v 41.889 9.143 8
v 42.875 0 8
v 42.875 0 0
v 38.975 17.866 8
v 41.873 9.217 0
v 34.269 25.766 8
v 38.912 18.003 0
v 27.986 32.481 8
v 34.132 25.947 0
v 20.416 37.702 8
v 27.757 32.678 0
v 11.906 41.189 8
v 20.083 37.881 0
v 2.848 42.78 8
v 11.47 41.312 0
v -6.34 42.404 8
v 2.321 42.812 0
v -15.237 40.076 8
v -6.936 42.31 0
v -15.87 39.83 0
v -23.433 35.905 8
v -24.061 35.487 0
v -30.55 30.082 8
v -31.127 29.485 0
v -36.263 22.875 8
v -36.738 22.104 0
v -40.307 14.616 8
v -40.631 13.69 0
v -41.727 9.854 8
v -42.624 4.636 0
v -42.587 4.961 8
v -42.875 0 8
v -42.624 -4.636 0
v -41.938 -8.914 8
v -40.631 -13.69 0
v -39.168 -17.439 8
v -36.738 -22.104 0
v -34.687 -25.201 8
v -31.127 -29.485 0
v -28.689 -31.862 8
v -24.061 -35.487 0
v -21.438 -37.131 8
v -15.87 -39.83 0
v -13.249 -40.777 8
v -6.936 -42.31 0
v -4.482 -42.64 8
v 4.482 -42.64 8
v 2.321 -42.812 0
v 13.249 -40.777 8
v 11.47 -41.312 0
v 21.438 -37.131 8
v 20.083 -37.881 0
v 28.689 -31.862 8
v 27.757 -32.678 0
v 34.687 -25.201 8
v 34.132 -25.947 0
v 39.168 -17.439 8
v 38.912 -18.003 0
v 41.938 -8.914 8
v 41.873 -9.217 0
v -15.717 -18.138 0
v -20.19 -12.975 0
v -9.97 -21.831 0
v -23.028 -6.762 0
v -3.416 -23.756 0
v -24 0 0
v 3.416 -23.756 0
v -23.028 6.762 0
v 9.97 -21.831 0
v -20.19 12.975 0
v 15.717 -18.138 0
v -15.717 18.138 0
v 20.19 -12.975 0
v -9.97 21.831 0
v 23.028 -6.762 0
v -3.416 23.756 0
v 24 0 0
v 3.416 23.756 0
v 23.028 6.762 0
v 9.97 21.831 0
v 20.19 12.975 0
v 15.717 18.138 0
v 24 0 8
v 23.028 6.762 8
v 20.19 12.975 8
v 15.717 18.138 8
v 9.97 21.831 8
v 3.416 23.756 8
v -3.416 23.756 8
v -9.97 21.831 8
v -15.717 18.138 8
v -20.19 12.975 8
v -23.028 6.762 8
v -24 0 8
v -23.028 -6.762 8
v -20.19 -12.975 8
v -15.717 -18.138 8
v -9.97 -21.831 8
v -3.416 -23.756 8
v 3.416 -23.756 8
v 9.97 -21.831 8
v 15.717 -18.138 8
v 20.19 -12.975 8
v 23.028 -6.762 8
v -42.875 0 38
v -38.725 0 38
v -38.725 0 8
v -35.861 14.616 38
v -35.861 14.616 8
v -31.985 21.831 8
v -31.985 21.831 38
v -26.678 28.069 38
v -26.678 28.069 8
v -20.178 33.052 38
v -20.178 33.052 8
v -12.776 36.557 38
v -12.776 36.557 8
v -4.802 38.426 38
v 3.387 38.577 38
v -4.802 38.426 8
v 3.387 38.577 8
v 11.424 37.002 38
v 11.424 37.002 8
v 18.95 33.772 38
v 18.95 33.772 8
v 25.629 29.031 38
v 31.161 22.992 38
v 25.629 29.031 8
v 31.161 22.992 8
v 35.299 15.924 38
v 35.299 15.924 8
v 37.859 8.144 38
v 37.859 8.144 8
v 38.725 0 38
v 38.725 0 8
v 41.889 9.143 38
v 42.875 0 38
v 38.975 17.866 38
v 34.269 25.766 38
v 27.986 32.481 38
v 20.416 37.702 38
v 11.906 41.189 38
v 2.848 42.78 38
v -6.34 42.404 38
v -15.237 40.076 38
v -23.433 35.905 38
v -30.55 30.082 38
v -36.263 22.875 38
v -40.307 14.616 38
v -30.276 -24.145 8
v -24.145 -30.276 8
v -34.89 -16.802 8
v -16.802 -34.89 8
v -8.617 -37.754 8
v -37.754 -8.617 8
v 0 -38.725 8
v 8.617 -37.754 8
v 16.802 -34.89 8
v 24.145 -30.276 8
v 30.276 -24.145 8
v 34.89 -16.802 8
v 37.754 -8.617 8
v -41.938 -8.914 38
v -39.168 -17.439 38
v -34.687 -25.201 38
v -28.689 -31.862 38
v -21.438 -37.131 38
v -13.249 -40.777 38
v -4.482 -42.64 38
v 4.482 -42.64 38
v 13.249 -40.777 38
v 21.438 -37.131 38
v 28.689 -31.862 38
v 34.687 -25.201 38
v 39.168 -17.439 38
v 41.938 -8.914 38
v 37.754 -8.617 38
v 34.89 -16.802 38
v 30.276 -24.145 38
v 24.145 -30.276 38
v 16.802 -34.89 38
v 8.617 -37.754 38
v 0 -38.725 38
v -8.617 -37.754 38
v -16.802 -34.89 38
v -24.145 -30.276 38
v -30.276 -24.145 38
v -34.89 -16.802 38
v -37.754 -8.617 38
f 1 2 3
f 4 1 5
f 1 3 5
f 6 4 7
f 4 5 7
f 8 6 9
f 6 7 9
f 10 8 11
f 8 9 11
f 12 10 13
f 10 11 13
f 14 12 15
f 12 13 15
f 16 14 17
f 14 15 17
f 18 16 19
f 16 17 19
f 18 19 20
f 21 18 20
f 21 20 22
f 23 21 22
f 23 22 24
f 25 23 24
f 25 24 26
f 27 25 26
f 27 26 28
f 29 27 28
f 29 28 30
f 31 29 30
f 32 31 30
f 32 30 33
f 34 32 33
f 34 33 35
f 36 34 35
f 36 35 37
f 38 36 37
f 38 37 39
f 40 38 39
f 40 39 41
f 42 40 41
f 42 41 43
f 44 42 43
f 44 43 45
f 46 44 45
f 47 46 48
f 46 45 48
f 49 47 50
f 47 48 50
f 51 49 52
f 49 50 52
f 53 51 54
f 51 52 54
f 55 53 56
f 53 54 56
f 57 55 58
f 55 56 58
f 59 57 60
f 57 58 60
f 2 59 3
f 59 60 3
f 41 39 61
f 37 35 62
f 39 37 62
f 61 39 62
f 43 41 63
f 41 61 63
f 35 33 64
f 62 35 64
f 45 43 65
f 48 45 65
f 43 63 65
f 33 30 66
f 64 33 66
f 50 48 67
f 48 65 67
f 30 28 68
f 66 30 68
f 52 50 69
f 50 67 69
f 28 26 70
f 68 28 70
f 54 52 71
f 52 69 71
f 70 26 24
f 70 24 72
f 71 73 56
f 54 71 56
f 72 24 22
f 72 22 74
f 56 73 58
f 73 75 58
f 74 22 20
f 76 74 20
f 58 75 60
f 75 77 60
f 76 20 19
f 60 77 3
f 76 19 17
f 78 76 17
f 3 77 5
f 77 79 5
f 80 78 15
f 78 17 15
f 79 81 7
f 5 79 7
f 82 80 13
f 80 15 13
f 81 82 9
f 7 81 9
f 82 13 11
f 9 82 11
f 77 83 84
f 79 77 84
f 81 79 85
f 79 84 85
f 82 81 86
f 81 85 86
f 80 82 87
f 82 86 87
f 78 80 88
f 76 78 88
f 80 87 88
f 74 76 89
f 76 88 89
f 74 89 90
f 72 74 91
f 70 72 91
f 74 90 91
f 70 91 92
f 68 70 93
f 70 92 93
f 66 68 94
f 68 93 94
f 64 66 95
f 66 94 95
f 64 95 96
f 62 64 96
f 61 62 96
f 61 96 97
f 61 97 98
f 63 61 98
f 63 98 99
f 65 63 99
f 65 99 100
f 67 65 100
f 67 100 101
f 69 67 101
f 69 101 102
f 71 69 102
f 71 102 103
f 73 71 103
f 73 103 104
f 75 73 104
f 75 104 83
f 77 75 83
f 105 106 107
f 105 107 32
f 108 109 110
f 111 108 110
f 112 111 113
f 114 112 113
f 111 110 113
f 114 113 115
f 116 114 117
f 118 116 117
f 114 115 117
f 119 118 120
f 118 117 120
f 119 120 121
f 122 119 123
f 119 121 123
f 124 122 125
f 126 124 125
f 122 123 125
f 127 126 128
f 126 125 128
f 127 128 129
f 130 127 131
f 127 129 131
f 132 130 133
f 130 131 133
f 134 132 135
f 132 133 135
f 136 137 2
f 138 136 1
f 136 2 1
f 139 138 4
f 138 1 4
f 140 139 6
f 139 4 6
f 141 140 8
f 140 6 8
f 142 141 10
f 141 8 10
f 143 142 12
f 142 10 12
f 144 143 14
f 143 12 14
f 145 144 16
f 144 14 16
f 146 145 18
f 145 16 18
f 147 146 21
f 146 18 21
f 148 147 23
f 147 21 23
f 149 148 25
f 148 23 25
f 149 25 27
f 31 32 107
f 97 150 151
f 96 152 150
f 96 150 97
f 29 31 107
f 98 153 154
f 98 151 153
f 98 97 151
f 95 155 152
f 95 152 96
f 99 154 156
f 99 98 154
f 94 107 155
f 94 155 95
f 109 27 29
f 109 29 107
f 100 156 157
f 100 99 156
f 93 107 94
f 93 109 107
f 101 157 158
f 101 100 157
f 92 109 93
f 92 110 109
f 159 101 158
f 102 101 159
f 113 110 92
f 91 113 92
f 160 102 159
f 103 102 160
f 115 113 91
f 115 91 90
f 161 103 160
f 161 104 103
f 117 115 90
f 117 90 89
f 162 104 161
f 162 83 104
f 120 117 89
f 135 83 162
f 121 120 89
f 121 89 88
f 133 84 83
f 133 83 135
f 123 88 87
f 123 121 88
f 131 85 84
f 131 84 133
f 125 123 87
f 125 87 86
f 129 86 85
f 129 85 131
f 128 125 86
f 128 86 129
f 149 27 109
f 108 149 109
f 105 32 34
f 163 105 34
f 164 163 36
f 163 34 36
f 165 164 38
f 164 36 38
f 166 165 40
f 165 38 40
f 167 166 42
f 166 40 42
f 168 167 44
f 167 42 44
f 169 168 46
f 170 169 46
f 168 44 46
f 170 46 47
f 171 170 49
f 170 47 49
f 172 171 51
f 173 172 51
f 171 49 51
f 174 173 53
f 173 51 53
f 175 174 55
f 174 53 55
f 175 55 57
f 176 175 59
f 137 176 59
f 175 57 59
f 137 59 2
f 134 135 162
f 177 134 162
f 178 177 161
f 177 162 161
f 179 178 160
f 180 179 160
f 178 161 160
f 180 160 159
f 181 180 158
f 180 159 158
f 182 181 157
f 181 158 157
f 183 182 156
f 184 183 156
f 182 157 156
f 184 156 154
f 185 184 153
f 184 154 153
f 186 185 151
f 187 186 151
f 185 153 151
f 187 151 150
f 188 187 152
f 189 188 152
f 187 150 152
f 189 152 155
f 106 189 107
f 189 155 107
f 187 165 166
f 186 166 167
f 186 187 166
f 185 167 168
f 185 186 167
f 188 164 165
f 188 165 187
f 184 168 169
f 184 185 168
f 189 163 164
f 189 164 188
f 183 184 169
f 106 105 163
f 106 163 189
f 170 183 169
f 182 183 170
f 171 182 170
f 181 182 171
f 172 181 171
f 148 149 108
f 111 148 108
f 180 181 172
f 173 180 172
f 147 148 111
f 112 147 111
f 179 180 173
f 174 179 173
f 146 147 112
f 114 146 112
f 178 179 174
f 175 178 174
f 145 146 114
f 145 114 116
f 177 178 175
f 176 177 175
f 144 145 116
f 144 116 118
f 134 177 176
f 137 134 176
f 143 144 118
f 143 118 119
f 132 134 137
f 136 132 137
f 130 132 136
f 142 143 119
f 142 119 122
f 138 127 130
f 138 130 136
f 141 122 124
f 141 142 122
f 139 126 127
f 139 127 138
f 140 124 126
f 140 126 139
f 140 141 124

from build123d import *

# Parameters (mm, degrees)
SKETCH1_R           = 42.875
BOSS_EXTRUDE1_DEPTH = 8
BOSS_EXTRUDE2_DEPTH = 30
SKETCH4_R           = 24
CUT_EXTRUDE1_DEPTH  = 20


with BuildPart() as part:
    # Sketch1 → Boss-Extrude1 (new body)
    with BuildSketch(Plane.XY):
        Circle(SKETCH1_R)
    extrude(amount=BOSS_EXTRUDE1_DEPTH)

    # Sketch2 → Boss-Extrude2 (add)
    with BuildSketch(Plane.XY.offset(8)):
        with BuildLine():
            ThreePointArc((38.725, 0), (0, -38.725), (-38.725, 0))
            Line((-38.725, 0), (-42.875, 0))
            ThreePointArc((-42.875, 0), (0, -42.875), (42.875, 0))
            ThreePointArc((42.875, 0), (7.419974343, 42.228066564), (-40.30678919, 14.616031274))
            Line((-40.30678919, 14.616031274), (-35.860803878, 14.616031274))
            ThreePointArc((-35.860803878, 14.616031274), (7.44701265, 38.002205562), (38.725, 0))
        make_face()
    extrude(amount=BOSS_EXTRUDE2_DEPTH)

    # Sketch4 → Cut-Extrude1 (cut)
    with BuildSketch(Plane.XY.offset(8)):
        Circle(SKETCH4_R)
    extrude(amount=-CUT_EXTRUDE1_DEPTH, mode=Mode.SUBTRACT)


solid = part.part
